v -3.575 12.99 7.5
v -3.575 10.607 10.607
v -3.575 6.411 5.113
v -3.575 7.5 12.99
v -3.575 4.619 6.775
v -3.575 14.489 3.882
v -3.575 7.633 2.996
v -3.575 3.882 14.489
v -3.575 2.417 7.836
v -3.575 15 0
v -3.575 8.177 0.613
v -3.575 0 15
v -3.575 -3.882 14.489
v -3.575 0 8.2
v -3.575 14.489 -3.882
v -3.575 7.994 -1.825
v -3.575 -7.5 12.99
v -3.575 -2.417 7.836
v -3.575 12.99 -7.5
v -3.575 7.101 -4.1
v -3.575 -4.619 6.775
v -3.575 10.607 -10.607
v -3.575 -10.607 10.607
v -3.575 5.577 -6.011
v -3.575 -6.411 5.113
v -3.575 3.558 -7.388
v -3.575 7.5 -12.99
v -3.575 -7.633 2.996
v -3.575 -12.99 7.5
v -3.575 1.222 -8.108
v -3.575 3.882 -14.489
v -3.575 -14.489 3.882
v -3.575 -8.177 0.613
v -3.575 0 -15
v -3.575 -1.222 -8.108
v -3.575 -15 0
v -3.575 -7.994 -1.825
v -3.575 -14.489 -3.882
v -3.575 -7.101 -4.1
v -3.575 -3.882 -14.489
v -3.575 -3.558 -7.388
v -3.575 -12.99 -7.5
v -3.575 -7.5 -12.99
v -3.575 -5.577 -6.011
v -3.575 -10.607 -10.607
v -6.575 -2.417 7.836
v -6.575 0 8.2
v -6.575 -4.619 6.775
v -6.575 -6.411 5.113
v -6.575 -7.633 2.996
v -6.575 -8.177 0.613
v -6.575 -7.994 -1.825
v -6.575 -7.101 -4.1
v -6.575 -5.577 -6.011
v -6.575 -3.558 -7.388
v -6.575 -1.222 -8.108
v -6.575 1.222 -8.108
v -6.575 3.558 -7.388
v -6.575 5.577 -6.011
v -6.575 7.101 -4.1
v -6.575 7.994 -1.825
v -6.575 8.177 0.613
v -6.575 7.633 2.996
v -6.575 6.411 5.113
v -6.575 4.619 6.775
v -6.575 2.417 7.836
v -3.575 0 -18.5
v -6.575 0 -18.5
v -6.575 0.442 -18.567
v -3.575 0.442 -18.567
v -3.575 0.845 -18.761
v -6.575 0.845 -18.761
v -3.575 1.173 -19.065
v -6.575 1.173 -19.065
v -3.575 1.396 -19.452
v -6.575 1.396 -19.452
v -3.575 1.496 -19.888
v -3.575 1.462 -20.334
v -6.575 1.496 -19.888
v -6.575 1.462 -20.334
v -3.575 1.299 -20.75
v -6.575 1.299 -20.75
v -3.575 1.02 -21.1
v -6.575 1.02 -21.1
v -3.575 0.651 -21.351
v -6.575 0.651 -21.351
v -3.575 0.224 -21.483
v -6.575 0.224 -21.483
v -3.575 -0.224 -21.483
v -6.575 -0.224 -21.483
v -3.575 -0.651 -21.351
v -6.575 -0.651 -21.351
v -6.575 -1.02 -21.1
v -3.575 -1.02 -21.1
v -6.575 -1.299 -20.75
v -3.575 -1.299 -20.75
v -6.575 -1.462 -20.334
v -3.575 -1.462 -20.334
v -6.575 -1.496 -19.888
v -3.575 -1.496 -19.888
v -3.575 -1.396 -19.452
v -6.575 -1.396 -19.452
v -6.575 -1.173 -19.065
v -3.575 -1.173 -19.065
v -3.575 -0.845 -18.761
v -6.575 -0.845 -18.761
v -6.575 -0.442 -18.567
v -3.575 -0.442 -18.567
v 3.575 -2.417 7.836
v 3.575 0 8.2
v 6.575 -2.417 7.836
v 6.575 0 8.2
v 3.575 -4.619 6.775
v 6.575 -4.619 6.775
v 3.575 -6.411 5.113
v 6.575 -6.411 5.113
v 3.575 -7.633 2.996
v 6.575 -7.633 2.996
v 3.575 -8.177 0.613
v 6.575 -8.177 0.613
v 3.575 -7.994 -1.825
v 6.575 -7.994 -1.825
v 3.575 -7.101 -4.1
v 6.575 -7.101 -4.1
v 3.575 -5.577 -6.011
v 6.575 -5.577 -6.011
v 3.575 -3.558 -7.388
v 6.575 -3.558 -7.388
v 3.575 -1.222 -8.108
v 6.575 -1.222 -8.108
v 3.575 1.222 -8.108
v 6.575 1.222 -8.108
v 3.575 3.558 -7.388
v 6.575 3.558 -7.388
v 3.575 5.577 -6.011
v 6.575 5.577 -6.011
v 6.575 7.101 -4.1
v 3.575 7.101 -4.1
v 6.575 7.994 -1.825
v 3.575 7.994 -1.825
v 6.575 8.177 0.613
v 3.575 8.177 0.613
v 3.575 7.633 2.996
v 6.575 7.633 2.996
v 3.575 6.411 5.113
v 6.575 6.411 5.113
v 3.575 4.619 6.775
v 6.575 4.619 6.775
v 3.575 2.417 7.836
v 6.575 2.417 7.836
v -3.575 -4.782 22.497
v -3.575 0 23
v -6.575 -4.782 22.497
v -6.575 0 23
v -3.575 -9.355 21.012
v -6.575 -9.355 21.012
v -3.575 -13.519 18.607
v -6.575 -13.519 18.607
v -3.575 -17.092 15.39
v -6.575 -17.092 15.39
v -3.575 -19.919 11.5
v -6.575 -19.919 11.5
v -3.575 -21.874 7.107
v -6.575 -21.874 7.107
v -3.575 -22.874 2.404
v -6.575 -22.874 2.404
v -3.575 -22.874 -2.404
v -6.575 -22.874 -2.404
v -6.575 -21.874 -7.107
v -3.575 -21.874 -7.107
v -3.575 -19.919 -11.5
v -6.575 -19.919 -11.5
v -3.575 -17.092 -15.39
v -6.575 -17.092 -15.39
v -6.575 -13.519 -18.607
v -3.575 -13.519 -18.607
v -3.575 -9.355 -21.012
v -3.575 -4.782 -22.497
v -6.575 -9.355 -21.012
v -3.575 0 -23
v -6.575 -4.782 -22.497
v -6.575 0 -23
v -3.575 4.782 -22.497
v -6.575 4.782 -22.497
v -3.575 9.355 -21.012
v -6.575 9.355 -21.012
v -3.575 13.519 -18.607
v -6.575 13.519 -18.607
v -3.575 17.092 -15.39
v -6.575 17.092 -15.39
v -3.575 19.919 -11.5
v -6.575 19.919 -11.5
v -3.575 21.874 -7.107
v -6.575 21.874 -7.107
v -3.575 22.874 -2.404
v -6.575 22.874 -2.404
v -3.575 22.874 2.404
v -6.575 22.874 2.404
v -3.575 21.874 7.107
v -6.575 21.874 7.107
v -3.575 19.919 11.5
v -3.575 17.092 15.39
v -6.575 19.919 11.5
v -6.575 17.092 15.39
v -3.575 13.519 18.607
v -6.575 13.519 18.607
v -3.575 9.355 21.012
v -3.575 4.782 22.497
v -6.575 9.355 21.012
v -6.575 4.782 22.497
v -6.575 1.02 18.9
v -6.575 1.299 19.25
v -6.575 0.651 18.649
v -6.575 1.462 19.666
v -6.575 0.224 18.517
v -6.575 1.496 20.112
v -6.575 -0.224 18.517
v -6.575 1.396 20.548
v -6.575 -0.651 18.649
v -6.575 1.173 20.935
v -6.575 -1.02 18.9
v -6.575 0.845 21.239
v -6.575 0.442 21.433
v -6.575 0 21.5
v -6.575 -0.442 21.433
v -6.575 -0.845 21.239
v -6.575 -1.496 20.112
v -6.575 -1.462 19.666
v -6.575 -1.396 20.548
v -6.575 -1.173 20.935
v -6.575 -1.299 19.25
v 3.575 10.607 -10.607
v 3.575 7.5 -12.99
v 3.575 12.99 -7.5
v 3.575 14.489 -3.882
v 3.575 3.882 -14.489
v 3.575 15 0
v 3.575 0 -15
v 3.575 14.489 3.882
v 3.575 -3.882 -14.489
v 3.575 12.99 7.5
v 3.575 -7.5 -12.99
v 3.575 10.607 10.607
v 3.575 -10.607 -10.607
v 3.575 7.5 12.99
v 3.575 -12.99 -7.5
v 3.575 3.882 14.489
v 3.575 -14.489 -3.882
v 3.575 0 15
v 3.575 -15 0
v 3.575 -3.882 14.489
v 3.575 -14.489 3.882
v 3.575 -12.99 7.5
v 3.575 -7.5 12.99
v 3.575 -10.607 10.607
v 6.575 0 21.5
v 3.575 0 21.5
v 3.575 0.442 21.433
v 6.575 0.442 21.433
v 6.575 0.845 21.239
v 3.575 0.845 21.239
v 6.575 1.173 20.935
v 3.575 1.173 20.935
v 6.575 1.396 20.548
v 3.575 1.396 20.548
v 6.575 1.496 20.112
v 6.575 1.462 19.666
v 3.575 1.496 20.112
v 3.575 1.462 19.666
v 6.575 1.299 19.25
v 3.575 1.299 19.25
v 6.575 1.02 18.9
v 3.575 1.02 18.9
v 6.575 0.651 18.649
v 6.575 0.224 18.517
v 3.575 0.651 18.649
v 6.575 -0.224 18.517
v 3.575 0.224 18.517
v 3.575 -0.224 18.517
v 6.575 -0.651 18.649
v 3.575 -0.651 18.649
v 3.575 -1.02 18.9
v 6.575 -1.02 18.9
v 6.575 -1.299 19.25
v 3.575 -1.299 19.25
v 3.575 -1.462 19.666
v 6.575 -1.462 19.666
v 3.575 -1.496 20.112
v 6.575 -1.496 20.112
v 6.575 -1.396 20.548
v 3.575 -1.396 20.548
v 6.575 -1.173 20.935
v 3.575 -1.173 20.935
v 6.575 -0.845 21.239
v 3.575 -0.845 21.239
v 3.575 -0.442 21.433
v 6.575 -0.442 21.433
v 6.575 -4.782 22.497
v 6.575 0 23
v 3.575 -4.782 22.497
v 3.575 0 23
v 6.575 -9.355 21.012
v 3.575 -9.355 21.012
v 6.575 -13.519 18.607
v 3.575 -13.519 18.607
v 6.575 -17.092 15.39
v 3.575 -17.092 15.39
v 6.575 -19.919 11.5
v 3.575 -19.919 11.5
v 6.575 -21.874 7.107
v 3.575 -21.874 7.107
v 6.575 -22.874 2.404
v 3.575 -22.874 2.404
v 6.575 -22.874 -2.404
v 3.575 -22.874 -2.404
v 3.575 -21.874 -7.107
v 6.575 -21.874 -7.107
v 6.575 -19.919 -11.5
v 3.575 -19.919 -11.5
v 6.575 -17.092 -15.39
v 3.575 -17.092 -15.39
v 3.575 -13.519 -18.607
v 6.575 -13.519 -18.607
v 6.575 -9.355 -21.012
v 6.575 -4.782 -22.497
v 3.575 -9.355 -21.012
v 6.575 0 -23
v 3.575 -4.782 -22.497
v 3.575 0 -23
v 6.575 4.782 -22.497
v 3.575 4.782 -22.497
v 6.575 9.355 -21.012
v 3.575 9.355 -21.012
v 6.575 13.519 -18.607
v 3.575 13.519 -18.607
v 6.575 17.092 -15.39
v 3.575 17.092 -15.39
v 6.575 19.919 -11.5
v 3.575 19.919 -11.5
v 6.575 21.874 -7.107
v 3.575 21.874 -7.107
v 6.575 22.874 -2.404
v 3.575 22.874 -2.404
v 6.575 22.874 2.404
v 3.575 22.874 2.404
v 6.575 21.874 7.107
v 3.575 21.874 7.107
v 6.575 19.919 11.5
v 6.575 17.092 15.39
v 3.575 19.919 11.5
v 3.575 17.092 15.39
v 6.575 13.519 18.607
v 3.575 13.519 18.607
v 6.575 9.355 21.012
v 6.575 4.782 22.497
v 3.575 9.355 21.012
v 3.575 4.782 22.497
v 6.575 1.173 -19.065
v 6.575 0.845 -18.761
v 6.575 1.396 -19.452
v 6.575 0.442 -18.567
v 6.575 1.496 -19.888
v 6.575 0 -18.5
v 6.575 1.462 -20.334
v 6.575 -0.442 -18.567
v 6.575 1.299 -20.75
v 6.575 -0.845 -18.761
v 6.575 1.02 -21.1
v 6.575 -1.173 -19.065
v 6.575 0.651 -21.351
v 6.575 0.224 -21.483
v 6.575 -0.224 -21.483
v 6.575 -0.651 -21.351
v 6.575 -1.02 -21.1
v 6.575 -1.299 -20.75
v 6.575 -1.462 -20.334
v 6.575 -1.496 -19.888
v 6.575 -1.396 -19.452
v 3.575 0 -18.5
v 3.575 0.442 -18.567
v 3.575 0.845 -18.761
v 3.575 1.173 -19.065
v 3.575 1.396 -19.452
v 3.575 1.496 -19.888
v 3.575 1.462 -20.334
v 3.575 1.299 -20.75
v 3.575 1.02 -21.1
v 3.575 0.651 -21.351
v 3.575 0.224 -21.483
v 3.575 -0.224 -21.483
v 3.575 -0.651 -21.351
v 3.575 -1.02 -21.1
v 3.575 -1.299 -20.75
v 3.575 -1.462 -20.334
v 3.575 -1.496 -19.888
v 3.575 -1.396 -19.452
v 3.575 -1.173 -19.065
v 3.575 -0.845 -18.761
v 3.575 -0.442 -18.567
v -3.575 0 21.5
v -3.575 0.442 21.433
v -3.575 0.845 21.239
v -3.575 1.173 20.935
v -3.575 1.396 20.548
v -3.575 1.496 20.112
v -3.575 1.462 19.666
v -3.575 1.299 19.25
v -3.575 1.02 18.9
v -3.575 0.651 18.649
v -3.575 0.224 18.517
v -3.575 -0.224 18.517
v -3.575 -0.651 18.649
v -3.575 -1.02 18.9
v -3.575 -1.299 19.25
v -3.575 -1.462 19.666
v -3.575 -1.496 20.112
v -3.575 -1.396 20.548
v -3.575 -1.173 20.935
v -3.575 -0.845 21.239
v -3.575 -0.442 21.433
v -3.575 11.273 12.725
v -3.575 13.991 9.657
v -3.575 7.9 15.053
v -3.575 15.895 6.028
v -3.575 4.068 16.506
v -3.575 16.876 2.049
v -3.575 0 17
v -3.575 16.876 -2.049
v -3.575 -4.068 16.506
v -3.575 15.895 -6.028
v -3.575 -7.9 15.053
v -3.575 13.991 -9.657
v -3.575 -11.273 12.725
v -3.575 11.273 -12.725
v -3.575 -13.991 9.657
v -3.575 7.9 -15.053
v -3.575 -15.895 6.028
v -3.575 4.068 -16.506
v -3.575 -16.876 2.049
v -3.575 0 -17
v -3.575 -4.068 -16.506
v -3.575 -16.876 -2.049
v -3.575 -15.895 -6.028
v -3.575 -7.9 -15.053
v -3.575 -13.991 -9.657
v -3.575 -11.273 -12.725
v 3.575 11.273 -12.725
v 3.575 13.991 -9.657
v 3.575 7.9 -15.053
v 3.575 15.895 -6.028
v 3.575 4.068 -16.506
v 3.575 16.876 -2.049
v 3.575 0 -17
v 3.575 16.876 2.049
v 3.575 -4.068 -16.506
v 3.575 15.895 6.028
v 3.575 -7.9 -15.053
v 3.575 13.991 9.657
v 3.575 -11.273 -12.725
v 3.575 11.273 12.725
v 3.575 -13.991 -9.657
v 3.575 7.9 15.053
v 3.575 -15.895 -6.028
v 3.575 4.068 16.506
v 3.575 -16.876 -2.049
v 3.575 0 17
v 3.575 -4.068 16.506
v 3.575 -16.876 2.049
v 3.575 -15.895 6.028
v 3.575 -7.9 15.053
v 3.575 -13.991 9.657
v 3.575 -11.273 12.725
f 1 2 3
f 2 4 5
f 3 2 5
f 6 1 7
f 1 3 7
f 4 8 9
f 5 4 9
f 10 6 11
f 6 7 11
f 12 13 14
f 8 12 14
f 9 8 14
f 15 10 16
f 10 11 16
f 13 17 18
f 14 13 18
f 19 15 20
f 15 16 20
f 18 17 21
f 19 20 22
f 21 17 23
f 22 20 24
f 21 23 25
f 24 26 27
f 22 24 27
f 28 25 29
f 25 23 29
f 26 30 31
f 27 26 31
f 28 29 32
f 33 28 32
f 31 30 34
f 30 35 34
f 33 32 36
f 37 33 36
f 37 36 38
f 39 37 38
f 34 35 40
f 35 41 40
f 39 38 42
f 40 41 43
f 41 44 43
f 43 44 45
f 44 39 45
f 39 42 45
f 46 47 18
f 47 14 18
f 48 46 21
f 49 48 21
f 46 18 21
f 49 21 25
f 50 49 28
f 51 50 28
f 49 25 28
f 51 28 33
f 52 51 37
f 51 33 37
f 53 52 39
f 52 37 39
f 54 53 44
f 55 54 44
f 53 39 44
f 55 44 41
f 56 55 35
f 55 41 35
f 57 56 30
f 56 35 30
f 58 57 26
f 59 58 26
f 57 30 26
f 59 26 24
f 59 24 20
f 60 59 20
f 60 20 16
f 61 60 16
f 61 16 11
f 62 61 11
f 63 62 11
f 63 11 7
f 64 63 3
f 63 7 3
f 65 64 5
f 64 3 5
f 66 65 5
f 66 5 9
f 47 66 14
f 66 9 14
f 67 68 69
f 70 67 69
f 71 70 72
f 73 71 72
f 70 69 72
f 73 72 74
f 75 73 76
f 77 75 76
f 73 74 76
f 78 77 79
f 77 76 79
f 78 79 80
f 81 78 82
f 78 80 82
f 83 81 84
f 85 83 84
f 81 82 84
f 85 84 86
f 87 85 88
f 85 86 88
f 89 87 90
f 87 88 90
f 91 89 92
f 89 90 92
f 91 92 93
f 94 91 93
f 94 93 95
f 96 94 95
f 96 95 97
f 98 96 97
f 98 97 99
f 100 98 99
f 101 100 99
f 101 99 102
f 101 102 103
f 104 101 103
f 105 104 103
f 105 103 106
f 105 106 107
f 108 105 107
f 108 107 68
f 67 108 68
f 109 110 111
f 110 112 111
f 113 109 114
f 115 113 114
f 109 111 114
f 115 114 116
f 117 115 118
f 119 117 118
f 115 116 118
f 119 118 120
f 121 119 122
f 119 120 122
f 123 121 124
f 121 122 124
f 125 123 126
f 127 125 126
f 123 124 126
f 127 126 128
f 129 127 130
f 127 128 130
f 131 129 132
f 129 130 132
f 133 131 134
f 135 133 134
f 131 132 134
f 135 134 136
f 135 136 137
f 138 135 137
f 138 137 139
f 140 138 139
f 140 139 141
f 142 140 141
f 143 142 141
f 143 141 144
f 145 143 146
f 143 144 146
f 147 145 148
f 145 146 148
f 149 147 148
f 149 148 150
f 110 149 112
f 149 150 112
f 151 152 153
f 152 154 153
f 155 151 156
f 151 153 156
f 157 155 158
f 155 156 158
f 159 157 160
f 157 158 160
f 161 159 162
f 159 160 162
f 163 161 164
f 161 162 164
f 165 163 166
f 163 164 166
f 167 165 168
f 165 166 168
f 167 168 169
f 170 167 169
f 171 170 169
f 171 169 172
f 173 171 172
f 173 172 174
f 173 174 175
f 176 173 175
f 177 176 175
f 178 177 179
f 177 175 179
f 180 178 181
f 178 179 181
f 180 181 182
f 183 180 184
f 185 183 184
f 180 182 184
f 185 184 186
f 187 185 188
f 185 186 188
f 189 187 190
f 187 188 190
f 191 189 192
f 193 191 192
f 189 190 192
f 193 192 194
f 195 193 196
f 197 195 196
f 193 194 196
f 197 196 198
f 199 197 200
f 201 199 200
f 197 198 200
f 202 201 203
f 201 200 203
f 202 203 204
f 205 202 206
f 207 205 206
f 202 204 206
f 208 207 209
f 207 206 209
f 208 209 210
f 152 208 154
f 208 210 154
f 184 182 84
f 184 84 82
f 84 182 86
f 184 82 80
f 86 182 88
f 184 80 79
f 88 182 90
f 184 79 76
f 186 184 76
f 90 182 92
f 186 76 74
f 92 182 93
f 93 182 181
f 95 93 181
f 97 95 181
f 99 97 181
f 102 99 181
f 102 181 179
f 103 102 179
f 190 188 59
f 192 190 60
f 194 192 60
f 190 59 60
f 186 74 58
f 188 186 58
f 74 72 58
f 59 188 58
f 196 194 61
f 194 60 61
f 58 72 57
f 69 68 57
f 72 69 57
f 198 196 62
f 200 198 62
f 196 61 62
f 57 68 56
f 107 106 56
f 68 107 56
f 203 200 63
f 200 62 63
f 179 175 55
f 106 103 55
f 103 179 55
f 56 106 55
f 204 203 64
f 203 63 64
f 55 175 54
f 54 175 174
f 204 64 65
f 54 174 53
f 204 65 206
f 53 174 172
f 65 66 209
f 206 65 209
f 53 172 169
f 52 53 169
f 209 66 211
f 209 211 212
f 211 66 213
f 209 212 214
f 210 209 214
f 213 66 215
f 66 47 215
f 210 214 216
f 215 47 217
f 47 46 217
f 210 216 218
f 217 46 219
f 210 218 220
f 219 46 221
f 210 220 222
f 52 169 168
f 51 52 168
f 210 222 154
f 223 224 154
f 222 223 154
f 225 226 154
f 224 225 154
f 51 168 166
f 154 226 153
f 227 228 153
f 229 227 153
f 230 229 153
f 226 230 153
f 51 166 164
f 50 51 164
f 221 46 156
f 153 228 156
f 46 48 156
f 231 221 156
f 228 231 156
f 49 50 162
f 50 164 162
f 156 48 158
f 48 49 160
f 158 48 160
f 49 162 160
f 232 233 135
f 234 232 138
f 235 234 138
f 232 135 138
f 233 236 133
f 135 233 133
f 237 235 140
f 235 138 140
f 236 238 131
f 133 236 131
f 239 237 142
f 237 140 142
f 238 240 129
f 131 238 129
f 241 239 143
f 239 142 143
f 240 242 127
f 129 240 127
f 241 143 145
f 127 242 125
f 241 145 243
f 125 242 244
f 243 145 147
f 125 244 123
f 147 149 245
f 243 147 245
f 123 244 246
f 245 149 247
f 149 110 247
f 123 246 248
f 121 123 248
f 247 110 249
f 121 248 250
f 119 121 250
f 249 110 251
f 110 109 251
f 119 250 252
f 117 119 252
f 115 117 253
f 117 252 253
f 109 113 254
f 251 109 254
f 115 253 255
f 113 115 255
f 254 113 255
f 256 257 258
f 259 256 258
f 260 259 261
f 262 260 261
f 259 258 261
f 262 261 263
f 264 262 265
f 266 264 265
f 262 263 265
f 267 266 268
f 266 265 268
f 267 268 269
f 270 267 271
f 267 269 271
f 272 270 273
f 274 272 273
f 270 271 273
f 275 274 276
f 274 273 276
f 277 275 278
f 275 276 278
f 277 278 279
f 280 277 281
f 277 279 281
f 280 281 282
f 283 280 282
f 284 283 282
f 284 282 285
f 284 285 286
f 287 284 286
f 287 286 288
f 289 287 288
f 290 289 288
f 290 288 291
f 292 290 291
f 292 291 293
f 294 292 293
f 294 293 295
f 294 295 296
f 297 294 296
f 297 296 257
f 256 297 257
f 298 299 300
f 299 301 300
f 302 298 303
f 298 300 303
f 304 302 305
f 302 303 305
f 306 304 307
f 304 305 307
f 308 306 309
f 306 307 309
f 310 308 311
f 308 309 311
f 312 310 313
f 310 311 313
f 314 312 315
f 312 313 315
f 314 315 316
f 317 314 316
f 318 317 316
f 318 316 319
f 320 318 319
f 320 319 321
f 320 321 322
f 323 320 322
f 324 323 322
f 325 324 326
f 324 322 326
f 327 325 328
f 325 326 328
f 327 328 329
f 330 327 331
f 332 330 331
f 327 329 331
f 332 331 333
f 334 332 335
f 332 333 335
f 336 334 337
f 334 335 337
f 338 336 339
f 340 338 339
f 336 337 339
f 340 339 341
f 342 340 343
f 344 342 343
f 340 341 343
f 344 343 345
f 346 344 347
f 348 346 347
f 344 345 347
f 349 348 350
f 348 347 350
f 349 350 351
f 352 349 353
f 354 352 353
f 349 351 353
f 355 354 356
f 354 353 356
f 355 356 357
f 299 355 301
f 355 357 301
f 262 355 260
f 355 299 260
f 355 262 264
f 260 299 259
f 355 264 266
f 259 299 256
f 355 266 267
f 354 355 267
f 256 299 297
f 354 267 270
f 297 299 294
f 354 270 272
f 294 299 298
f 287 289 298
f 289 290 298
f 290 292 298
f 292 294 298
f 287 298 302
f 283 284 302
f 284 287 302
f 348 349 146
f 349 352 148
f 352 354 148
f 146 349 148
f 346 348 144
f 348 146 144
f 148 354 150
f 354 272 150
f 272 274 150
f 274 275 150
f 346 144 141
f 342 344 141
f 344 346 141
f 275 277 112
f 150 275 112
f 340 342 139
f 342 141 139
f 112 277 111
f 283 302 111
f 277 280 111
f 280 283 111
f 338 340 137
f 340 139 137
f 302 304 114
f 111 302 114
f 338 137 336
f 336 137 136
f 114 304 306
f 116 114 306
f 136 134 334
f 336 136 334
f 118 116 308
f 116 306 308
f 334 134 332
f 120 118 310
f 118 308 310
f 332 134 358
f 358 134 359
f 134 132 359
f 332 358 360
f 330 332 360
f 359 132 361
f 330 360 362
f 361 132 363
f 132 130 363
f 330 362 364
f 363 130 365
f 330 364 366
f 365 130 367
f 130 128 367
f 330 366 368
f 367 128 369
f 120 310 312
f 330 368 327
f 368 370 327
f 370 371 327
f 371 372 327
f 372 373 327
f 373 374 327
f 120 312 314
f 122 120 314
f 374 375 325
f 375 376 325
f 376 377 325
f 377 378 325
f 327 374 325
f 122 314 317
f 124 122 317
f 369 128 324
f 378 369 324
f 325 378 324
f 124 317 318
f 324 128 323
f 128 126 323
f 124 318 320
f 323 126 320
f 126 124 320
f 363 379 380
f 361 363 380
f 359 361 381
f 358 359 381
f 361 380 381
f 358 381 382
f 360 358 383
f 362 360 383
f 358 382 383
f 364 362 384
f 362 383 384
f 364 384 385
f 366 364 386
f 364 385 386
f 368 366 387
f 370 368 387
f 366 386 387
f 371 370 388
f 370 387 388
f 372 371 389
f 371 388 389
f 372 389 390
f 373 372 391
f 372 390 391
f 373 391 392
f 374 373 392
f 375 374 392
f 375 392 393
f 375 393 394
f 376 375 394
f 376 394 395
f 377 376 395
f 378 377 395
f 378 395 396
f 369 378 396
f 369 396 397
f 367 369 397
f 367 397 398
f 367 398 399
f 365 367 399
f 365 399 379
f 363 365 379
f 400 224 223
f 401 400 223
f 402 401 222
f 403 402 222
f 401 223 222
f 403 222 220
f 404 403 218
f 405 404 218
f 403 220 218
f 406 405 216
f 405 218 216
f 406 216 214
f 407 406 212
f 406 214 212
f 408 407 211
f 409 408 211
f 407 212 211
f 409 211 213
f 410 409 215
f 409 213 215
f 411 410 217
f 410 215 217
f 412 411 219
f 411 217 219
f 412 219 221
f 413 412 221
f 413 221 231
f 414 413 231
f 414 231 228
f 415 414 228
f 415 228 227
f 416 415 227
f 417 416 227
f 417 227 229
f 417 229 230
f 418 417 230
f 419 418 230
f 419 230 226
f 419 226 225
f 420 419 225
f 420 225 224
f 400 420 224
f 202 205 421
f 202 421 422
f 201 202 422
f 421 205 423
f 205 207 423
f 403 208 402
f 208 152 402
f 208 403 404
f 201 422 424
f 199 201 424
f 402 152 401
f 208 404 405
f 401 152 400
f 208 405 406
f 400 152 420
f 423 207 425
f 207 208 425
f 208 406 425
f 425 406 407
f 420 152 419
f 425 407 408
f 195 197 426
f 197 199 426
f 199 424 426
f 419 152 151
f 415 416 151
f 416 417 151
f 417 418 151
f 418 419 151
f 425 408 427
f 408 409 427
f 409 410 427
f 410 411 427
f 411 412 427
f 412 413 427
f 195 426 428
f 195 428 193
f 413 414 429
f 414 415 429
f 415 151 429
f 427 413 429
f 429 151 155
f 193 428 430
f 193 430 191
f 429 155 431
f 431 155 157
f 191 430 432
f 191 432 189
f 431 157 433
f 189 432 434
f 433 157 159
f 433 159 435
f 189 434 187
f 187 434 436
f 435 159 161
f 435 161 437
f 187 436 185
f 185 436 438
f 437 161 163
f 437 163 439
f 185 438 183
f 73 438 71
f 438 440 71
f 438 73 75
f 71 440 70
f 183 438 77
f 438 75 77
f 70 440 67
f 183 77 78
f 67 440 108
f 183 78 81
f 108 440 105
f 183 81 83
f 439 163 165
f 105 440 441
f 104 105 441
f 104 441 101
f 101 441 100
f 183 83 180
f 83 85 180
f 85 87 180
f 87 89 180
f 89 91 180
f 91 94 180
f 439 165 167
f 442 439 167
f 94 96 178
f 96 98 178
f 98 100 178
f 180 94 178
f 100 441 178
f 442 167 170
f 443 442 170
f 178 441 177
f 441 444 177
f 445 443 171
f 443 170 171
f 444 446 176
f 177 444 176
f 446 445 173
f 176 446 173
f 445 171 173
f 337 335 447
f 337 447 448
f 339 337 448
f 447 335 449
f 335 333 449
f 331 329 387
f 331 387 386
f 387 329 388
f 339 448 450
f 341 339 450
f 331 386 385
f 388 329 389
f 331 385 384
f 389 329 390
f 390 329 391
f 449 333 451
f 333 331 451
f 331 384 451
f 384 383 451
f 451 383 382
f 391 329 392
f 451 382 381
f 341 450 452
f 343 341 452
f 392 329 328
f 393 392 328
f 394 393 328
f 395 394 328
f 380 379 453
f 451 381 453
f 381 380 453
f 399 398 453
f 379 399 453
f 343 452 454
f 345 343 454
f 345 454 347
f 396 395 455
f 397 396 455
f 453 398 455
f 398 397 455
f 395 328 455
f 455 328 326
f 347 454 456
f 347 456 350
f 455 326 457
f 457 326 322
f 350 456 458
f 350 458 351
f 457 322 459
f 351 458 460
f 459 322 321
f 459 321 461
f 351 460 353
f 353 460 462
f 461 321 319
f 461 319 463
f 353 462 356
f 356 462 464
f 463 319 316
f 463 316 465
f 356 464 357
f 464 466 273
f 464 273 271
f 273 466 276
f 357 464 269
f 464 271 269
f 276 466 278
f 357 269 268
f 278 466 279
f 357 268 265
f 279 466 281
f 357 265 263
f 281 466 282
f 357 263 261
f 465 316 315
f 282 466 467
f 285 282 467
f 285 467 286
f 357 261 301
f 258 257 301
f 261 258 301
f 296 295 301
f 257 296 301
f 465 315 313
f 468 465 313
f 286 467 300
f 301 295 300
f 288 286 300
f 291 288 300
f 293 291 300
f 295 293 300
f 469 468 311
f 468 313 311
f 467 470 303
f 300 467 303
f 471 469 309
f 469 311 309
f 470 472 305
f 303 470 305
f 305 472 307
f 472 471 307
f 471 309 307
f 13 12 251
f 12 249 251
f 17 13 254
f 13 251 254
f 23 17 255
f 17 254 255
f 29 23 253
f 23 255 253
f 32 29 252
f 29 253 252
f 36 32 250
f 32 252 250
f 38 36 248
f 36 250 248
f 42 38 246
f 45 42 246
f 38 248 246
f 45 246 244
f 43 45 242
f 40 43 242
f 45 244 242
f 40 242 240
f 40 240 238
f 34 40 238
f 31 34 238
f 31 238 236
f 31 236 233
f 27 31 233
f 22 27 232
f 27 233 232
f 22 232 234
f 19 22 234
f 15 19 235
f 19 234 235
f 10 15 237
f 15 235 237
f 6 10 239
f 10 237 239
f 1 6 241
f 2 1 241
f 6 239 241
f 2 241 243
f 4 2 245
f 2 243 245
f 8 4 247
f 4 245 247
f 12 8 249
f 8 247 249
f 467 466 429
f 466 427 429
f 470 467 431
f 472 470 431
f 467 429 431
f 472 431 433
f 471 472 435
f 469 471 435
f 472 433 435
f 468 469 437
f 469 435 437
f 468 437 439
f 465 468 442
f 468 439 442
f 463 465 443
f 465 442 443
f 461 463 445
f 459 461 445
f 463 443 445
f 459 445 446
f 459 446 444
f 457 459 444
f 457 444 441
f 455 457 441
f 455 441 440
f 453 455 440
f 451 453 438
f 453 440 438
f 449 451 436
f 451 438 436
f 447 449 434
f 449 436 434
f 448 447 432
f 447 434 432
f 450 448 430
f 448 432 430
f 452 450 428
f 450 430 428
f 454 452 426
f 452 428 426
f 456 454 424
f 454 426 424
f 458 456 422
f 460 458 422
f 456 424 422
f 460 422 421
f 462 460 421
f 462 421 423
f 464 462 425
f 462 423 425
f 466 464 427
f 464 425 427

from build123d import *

# Parameters (mm, degrees)
SKETCH_2_R          = 1.5
CUT_EXTRUDE_1_DEPTH = 30


with BuildPart() as part:
    # 草图1 → 旋转1 (revolve)
    with BuildSketch(Plane.XY, mode=Mode.PRIVATE) as revolve_1_sk:
        Polygon((-3.575, 15), (3.575, 15), (3.575, 8.2), (6.575, 8.2), (6.575, 23), (3.575, 23), (3.575, 17), (-3.575, 17), (-3.575, 23), (-6.575, 23), (-6.575, 8.2), (-3.575, 8.2), align=None)
    revolve(revolve_1_sk.sketch.rotate(Axis((0, 0, 0), (1, 0, 0)), 90), axis=Axis((0, 0, 0), (1, 0, 0)))

    # 草图2 → 切除-拉伸1 (cut)
    with BuildSketch(Plane.ZY.offset(6.575)):
        with Locations((20, 0)):
            Circle(SKETCH_2_R)
        with Locations((-20, 0)):
            Circle(SKETCH_2_R)
    extrude(amount=-CUT_EXTRUDE_1_DEPTH, mode=Mode.SUBTRACT)


solid = part.part
